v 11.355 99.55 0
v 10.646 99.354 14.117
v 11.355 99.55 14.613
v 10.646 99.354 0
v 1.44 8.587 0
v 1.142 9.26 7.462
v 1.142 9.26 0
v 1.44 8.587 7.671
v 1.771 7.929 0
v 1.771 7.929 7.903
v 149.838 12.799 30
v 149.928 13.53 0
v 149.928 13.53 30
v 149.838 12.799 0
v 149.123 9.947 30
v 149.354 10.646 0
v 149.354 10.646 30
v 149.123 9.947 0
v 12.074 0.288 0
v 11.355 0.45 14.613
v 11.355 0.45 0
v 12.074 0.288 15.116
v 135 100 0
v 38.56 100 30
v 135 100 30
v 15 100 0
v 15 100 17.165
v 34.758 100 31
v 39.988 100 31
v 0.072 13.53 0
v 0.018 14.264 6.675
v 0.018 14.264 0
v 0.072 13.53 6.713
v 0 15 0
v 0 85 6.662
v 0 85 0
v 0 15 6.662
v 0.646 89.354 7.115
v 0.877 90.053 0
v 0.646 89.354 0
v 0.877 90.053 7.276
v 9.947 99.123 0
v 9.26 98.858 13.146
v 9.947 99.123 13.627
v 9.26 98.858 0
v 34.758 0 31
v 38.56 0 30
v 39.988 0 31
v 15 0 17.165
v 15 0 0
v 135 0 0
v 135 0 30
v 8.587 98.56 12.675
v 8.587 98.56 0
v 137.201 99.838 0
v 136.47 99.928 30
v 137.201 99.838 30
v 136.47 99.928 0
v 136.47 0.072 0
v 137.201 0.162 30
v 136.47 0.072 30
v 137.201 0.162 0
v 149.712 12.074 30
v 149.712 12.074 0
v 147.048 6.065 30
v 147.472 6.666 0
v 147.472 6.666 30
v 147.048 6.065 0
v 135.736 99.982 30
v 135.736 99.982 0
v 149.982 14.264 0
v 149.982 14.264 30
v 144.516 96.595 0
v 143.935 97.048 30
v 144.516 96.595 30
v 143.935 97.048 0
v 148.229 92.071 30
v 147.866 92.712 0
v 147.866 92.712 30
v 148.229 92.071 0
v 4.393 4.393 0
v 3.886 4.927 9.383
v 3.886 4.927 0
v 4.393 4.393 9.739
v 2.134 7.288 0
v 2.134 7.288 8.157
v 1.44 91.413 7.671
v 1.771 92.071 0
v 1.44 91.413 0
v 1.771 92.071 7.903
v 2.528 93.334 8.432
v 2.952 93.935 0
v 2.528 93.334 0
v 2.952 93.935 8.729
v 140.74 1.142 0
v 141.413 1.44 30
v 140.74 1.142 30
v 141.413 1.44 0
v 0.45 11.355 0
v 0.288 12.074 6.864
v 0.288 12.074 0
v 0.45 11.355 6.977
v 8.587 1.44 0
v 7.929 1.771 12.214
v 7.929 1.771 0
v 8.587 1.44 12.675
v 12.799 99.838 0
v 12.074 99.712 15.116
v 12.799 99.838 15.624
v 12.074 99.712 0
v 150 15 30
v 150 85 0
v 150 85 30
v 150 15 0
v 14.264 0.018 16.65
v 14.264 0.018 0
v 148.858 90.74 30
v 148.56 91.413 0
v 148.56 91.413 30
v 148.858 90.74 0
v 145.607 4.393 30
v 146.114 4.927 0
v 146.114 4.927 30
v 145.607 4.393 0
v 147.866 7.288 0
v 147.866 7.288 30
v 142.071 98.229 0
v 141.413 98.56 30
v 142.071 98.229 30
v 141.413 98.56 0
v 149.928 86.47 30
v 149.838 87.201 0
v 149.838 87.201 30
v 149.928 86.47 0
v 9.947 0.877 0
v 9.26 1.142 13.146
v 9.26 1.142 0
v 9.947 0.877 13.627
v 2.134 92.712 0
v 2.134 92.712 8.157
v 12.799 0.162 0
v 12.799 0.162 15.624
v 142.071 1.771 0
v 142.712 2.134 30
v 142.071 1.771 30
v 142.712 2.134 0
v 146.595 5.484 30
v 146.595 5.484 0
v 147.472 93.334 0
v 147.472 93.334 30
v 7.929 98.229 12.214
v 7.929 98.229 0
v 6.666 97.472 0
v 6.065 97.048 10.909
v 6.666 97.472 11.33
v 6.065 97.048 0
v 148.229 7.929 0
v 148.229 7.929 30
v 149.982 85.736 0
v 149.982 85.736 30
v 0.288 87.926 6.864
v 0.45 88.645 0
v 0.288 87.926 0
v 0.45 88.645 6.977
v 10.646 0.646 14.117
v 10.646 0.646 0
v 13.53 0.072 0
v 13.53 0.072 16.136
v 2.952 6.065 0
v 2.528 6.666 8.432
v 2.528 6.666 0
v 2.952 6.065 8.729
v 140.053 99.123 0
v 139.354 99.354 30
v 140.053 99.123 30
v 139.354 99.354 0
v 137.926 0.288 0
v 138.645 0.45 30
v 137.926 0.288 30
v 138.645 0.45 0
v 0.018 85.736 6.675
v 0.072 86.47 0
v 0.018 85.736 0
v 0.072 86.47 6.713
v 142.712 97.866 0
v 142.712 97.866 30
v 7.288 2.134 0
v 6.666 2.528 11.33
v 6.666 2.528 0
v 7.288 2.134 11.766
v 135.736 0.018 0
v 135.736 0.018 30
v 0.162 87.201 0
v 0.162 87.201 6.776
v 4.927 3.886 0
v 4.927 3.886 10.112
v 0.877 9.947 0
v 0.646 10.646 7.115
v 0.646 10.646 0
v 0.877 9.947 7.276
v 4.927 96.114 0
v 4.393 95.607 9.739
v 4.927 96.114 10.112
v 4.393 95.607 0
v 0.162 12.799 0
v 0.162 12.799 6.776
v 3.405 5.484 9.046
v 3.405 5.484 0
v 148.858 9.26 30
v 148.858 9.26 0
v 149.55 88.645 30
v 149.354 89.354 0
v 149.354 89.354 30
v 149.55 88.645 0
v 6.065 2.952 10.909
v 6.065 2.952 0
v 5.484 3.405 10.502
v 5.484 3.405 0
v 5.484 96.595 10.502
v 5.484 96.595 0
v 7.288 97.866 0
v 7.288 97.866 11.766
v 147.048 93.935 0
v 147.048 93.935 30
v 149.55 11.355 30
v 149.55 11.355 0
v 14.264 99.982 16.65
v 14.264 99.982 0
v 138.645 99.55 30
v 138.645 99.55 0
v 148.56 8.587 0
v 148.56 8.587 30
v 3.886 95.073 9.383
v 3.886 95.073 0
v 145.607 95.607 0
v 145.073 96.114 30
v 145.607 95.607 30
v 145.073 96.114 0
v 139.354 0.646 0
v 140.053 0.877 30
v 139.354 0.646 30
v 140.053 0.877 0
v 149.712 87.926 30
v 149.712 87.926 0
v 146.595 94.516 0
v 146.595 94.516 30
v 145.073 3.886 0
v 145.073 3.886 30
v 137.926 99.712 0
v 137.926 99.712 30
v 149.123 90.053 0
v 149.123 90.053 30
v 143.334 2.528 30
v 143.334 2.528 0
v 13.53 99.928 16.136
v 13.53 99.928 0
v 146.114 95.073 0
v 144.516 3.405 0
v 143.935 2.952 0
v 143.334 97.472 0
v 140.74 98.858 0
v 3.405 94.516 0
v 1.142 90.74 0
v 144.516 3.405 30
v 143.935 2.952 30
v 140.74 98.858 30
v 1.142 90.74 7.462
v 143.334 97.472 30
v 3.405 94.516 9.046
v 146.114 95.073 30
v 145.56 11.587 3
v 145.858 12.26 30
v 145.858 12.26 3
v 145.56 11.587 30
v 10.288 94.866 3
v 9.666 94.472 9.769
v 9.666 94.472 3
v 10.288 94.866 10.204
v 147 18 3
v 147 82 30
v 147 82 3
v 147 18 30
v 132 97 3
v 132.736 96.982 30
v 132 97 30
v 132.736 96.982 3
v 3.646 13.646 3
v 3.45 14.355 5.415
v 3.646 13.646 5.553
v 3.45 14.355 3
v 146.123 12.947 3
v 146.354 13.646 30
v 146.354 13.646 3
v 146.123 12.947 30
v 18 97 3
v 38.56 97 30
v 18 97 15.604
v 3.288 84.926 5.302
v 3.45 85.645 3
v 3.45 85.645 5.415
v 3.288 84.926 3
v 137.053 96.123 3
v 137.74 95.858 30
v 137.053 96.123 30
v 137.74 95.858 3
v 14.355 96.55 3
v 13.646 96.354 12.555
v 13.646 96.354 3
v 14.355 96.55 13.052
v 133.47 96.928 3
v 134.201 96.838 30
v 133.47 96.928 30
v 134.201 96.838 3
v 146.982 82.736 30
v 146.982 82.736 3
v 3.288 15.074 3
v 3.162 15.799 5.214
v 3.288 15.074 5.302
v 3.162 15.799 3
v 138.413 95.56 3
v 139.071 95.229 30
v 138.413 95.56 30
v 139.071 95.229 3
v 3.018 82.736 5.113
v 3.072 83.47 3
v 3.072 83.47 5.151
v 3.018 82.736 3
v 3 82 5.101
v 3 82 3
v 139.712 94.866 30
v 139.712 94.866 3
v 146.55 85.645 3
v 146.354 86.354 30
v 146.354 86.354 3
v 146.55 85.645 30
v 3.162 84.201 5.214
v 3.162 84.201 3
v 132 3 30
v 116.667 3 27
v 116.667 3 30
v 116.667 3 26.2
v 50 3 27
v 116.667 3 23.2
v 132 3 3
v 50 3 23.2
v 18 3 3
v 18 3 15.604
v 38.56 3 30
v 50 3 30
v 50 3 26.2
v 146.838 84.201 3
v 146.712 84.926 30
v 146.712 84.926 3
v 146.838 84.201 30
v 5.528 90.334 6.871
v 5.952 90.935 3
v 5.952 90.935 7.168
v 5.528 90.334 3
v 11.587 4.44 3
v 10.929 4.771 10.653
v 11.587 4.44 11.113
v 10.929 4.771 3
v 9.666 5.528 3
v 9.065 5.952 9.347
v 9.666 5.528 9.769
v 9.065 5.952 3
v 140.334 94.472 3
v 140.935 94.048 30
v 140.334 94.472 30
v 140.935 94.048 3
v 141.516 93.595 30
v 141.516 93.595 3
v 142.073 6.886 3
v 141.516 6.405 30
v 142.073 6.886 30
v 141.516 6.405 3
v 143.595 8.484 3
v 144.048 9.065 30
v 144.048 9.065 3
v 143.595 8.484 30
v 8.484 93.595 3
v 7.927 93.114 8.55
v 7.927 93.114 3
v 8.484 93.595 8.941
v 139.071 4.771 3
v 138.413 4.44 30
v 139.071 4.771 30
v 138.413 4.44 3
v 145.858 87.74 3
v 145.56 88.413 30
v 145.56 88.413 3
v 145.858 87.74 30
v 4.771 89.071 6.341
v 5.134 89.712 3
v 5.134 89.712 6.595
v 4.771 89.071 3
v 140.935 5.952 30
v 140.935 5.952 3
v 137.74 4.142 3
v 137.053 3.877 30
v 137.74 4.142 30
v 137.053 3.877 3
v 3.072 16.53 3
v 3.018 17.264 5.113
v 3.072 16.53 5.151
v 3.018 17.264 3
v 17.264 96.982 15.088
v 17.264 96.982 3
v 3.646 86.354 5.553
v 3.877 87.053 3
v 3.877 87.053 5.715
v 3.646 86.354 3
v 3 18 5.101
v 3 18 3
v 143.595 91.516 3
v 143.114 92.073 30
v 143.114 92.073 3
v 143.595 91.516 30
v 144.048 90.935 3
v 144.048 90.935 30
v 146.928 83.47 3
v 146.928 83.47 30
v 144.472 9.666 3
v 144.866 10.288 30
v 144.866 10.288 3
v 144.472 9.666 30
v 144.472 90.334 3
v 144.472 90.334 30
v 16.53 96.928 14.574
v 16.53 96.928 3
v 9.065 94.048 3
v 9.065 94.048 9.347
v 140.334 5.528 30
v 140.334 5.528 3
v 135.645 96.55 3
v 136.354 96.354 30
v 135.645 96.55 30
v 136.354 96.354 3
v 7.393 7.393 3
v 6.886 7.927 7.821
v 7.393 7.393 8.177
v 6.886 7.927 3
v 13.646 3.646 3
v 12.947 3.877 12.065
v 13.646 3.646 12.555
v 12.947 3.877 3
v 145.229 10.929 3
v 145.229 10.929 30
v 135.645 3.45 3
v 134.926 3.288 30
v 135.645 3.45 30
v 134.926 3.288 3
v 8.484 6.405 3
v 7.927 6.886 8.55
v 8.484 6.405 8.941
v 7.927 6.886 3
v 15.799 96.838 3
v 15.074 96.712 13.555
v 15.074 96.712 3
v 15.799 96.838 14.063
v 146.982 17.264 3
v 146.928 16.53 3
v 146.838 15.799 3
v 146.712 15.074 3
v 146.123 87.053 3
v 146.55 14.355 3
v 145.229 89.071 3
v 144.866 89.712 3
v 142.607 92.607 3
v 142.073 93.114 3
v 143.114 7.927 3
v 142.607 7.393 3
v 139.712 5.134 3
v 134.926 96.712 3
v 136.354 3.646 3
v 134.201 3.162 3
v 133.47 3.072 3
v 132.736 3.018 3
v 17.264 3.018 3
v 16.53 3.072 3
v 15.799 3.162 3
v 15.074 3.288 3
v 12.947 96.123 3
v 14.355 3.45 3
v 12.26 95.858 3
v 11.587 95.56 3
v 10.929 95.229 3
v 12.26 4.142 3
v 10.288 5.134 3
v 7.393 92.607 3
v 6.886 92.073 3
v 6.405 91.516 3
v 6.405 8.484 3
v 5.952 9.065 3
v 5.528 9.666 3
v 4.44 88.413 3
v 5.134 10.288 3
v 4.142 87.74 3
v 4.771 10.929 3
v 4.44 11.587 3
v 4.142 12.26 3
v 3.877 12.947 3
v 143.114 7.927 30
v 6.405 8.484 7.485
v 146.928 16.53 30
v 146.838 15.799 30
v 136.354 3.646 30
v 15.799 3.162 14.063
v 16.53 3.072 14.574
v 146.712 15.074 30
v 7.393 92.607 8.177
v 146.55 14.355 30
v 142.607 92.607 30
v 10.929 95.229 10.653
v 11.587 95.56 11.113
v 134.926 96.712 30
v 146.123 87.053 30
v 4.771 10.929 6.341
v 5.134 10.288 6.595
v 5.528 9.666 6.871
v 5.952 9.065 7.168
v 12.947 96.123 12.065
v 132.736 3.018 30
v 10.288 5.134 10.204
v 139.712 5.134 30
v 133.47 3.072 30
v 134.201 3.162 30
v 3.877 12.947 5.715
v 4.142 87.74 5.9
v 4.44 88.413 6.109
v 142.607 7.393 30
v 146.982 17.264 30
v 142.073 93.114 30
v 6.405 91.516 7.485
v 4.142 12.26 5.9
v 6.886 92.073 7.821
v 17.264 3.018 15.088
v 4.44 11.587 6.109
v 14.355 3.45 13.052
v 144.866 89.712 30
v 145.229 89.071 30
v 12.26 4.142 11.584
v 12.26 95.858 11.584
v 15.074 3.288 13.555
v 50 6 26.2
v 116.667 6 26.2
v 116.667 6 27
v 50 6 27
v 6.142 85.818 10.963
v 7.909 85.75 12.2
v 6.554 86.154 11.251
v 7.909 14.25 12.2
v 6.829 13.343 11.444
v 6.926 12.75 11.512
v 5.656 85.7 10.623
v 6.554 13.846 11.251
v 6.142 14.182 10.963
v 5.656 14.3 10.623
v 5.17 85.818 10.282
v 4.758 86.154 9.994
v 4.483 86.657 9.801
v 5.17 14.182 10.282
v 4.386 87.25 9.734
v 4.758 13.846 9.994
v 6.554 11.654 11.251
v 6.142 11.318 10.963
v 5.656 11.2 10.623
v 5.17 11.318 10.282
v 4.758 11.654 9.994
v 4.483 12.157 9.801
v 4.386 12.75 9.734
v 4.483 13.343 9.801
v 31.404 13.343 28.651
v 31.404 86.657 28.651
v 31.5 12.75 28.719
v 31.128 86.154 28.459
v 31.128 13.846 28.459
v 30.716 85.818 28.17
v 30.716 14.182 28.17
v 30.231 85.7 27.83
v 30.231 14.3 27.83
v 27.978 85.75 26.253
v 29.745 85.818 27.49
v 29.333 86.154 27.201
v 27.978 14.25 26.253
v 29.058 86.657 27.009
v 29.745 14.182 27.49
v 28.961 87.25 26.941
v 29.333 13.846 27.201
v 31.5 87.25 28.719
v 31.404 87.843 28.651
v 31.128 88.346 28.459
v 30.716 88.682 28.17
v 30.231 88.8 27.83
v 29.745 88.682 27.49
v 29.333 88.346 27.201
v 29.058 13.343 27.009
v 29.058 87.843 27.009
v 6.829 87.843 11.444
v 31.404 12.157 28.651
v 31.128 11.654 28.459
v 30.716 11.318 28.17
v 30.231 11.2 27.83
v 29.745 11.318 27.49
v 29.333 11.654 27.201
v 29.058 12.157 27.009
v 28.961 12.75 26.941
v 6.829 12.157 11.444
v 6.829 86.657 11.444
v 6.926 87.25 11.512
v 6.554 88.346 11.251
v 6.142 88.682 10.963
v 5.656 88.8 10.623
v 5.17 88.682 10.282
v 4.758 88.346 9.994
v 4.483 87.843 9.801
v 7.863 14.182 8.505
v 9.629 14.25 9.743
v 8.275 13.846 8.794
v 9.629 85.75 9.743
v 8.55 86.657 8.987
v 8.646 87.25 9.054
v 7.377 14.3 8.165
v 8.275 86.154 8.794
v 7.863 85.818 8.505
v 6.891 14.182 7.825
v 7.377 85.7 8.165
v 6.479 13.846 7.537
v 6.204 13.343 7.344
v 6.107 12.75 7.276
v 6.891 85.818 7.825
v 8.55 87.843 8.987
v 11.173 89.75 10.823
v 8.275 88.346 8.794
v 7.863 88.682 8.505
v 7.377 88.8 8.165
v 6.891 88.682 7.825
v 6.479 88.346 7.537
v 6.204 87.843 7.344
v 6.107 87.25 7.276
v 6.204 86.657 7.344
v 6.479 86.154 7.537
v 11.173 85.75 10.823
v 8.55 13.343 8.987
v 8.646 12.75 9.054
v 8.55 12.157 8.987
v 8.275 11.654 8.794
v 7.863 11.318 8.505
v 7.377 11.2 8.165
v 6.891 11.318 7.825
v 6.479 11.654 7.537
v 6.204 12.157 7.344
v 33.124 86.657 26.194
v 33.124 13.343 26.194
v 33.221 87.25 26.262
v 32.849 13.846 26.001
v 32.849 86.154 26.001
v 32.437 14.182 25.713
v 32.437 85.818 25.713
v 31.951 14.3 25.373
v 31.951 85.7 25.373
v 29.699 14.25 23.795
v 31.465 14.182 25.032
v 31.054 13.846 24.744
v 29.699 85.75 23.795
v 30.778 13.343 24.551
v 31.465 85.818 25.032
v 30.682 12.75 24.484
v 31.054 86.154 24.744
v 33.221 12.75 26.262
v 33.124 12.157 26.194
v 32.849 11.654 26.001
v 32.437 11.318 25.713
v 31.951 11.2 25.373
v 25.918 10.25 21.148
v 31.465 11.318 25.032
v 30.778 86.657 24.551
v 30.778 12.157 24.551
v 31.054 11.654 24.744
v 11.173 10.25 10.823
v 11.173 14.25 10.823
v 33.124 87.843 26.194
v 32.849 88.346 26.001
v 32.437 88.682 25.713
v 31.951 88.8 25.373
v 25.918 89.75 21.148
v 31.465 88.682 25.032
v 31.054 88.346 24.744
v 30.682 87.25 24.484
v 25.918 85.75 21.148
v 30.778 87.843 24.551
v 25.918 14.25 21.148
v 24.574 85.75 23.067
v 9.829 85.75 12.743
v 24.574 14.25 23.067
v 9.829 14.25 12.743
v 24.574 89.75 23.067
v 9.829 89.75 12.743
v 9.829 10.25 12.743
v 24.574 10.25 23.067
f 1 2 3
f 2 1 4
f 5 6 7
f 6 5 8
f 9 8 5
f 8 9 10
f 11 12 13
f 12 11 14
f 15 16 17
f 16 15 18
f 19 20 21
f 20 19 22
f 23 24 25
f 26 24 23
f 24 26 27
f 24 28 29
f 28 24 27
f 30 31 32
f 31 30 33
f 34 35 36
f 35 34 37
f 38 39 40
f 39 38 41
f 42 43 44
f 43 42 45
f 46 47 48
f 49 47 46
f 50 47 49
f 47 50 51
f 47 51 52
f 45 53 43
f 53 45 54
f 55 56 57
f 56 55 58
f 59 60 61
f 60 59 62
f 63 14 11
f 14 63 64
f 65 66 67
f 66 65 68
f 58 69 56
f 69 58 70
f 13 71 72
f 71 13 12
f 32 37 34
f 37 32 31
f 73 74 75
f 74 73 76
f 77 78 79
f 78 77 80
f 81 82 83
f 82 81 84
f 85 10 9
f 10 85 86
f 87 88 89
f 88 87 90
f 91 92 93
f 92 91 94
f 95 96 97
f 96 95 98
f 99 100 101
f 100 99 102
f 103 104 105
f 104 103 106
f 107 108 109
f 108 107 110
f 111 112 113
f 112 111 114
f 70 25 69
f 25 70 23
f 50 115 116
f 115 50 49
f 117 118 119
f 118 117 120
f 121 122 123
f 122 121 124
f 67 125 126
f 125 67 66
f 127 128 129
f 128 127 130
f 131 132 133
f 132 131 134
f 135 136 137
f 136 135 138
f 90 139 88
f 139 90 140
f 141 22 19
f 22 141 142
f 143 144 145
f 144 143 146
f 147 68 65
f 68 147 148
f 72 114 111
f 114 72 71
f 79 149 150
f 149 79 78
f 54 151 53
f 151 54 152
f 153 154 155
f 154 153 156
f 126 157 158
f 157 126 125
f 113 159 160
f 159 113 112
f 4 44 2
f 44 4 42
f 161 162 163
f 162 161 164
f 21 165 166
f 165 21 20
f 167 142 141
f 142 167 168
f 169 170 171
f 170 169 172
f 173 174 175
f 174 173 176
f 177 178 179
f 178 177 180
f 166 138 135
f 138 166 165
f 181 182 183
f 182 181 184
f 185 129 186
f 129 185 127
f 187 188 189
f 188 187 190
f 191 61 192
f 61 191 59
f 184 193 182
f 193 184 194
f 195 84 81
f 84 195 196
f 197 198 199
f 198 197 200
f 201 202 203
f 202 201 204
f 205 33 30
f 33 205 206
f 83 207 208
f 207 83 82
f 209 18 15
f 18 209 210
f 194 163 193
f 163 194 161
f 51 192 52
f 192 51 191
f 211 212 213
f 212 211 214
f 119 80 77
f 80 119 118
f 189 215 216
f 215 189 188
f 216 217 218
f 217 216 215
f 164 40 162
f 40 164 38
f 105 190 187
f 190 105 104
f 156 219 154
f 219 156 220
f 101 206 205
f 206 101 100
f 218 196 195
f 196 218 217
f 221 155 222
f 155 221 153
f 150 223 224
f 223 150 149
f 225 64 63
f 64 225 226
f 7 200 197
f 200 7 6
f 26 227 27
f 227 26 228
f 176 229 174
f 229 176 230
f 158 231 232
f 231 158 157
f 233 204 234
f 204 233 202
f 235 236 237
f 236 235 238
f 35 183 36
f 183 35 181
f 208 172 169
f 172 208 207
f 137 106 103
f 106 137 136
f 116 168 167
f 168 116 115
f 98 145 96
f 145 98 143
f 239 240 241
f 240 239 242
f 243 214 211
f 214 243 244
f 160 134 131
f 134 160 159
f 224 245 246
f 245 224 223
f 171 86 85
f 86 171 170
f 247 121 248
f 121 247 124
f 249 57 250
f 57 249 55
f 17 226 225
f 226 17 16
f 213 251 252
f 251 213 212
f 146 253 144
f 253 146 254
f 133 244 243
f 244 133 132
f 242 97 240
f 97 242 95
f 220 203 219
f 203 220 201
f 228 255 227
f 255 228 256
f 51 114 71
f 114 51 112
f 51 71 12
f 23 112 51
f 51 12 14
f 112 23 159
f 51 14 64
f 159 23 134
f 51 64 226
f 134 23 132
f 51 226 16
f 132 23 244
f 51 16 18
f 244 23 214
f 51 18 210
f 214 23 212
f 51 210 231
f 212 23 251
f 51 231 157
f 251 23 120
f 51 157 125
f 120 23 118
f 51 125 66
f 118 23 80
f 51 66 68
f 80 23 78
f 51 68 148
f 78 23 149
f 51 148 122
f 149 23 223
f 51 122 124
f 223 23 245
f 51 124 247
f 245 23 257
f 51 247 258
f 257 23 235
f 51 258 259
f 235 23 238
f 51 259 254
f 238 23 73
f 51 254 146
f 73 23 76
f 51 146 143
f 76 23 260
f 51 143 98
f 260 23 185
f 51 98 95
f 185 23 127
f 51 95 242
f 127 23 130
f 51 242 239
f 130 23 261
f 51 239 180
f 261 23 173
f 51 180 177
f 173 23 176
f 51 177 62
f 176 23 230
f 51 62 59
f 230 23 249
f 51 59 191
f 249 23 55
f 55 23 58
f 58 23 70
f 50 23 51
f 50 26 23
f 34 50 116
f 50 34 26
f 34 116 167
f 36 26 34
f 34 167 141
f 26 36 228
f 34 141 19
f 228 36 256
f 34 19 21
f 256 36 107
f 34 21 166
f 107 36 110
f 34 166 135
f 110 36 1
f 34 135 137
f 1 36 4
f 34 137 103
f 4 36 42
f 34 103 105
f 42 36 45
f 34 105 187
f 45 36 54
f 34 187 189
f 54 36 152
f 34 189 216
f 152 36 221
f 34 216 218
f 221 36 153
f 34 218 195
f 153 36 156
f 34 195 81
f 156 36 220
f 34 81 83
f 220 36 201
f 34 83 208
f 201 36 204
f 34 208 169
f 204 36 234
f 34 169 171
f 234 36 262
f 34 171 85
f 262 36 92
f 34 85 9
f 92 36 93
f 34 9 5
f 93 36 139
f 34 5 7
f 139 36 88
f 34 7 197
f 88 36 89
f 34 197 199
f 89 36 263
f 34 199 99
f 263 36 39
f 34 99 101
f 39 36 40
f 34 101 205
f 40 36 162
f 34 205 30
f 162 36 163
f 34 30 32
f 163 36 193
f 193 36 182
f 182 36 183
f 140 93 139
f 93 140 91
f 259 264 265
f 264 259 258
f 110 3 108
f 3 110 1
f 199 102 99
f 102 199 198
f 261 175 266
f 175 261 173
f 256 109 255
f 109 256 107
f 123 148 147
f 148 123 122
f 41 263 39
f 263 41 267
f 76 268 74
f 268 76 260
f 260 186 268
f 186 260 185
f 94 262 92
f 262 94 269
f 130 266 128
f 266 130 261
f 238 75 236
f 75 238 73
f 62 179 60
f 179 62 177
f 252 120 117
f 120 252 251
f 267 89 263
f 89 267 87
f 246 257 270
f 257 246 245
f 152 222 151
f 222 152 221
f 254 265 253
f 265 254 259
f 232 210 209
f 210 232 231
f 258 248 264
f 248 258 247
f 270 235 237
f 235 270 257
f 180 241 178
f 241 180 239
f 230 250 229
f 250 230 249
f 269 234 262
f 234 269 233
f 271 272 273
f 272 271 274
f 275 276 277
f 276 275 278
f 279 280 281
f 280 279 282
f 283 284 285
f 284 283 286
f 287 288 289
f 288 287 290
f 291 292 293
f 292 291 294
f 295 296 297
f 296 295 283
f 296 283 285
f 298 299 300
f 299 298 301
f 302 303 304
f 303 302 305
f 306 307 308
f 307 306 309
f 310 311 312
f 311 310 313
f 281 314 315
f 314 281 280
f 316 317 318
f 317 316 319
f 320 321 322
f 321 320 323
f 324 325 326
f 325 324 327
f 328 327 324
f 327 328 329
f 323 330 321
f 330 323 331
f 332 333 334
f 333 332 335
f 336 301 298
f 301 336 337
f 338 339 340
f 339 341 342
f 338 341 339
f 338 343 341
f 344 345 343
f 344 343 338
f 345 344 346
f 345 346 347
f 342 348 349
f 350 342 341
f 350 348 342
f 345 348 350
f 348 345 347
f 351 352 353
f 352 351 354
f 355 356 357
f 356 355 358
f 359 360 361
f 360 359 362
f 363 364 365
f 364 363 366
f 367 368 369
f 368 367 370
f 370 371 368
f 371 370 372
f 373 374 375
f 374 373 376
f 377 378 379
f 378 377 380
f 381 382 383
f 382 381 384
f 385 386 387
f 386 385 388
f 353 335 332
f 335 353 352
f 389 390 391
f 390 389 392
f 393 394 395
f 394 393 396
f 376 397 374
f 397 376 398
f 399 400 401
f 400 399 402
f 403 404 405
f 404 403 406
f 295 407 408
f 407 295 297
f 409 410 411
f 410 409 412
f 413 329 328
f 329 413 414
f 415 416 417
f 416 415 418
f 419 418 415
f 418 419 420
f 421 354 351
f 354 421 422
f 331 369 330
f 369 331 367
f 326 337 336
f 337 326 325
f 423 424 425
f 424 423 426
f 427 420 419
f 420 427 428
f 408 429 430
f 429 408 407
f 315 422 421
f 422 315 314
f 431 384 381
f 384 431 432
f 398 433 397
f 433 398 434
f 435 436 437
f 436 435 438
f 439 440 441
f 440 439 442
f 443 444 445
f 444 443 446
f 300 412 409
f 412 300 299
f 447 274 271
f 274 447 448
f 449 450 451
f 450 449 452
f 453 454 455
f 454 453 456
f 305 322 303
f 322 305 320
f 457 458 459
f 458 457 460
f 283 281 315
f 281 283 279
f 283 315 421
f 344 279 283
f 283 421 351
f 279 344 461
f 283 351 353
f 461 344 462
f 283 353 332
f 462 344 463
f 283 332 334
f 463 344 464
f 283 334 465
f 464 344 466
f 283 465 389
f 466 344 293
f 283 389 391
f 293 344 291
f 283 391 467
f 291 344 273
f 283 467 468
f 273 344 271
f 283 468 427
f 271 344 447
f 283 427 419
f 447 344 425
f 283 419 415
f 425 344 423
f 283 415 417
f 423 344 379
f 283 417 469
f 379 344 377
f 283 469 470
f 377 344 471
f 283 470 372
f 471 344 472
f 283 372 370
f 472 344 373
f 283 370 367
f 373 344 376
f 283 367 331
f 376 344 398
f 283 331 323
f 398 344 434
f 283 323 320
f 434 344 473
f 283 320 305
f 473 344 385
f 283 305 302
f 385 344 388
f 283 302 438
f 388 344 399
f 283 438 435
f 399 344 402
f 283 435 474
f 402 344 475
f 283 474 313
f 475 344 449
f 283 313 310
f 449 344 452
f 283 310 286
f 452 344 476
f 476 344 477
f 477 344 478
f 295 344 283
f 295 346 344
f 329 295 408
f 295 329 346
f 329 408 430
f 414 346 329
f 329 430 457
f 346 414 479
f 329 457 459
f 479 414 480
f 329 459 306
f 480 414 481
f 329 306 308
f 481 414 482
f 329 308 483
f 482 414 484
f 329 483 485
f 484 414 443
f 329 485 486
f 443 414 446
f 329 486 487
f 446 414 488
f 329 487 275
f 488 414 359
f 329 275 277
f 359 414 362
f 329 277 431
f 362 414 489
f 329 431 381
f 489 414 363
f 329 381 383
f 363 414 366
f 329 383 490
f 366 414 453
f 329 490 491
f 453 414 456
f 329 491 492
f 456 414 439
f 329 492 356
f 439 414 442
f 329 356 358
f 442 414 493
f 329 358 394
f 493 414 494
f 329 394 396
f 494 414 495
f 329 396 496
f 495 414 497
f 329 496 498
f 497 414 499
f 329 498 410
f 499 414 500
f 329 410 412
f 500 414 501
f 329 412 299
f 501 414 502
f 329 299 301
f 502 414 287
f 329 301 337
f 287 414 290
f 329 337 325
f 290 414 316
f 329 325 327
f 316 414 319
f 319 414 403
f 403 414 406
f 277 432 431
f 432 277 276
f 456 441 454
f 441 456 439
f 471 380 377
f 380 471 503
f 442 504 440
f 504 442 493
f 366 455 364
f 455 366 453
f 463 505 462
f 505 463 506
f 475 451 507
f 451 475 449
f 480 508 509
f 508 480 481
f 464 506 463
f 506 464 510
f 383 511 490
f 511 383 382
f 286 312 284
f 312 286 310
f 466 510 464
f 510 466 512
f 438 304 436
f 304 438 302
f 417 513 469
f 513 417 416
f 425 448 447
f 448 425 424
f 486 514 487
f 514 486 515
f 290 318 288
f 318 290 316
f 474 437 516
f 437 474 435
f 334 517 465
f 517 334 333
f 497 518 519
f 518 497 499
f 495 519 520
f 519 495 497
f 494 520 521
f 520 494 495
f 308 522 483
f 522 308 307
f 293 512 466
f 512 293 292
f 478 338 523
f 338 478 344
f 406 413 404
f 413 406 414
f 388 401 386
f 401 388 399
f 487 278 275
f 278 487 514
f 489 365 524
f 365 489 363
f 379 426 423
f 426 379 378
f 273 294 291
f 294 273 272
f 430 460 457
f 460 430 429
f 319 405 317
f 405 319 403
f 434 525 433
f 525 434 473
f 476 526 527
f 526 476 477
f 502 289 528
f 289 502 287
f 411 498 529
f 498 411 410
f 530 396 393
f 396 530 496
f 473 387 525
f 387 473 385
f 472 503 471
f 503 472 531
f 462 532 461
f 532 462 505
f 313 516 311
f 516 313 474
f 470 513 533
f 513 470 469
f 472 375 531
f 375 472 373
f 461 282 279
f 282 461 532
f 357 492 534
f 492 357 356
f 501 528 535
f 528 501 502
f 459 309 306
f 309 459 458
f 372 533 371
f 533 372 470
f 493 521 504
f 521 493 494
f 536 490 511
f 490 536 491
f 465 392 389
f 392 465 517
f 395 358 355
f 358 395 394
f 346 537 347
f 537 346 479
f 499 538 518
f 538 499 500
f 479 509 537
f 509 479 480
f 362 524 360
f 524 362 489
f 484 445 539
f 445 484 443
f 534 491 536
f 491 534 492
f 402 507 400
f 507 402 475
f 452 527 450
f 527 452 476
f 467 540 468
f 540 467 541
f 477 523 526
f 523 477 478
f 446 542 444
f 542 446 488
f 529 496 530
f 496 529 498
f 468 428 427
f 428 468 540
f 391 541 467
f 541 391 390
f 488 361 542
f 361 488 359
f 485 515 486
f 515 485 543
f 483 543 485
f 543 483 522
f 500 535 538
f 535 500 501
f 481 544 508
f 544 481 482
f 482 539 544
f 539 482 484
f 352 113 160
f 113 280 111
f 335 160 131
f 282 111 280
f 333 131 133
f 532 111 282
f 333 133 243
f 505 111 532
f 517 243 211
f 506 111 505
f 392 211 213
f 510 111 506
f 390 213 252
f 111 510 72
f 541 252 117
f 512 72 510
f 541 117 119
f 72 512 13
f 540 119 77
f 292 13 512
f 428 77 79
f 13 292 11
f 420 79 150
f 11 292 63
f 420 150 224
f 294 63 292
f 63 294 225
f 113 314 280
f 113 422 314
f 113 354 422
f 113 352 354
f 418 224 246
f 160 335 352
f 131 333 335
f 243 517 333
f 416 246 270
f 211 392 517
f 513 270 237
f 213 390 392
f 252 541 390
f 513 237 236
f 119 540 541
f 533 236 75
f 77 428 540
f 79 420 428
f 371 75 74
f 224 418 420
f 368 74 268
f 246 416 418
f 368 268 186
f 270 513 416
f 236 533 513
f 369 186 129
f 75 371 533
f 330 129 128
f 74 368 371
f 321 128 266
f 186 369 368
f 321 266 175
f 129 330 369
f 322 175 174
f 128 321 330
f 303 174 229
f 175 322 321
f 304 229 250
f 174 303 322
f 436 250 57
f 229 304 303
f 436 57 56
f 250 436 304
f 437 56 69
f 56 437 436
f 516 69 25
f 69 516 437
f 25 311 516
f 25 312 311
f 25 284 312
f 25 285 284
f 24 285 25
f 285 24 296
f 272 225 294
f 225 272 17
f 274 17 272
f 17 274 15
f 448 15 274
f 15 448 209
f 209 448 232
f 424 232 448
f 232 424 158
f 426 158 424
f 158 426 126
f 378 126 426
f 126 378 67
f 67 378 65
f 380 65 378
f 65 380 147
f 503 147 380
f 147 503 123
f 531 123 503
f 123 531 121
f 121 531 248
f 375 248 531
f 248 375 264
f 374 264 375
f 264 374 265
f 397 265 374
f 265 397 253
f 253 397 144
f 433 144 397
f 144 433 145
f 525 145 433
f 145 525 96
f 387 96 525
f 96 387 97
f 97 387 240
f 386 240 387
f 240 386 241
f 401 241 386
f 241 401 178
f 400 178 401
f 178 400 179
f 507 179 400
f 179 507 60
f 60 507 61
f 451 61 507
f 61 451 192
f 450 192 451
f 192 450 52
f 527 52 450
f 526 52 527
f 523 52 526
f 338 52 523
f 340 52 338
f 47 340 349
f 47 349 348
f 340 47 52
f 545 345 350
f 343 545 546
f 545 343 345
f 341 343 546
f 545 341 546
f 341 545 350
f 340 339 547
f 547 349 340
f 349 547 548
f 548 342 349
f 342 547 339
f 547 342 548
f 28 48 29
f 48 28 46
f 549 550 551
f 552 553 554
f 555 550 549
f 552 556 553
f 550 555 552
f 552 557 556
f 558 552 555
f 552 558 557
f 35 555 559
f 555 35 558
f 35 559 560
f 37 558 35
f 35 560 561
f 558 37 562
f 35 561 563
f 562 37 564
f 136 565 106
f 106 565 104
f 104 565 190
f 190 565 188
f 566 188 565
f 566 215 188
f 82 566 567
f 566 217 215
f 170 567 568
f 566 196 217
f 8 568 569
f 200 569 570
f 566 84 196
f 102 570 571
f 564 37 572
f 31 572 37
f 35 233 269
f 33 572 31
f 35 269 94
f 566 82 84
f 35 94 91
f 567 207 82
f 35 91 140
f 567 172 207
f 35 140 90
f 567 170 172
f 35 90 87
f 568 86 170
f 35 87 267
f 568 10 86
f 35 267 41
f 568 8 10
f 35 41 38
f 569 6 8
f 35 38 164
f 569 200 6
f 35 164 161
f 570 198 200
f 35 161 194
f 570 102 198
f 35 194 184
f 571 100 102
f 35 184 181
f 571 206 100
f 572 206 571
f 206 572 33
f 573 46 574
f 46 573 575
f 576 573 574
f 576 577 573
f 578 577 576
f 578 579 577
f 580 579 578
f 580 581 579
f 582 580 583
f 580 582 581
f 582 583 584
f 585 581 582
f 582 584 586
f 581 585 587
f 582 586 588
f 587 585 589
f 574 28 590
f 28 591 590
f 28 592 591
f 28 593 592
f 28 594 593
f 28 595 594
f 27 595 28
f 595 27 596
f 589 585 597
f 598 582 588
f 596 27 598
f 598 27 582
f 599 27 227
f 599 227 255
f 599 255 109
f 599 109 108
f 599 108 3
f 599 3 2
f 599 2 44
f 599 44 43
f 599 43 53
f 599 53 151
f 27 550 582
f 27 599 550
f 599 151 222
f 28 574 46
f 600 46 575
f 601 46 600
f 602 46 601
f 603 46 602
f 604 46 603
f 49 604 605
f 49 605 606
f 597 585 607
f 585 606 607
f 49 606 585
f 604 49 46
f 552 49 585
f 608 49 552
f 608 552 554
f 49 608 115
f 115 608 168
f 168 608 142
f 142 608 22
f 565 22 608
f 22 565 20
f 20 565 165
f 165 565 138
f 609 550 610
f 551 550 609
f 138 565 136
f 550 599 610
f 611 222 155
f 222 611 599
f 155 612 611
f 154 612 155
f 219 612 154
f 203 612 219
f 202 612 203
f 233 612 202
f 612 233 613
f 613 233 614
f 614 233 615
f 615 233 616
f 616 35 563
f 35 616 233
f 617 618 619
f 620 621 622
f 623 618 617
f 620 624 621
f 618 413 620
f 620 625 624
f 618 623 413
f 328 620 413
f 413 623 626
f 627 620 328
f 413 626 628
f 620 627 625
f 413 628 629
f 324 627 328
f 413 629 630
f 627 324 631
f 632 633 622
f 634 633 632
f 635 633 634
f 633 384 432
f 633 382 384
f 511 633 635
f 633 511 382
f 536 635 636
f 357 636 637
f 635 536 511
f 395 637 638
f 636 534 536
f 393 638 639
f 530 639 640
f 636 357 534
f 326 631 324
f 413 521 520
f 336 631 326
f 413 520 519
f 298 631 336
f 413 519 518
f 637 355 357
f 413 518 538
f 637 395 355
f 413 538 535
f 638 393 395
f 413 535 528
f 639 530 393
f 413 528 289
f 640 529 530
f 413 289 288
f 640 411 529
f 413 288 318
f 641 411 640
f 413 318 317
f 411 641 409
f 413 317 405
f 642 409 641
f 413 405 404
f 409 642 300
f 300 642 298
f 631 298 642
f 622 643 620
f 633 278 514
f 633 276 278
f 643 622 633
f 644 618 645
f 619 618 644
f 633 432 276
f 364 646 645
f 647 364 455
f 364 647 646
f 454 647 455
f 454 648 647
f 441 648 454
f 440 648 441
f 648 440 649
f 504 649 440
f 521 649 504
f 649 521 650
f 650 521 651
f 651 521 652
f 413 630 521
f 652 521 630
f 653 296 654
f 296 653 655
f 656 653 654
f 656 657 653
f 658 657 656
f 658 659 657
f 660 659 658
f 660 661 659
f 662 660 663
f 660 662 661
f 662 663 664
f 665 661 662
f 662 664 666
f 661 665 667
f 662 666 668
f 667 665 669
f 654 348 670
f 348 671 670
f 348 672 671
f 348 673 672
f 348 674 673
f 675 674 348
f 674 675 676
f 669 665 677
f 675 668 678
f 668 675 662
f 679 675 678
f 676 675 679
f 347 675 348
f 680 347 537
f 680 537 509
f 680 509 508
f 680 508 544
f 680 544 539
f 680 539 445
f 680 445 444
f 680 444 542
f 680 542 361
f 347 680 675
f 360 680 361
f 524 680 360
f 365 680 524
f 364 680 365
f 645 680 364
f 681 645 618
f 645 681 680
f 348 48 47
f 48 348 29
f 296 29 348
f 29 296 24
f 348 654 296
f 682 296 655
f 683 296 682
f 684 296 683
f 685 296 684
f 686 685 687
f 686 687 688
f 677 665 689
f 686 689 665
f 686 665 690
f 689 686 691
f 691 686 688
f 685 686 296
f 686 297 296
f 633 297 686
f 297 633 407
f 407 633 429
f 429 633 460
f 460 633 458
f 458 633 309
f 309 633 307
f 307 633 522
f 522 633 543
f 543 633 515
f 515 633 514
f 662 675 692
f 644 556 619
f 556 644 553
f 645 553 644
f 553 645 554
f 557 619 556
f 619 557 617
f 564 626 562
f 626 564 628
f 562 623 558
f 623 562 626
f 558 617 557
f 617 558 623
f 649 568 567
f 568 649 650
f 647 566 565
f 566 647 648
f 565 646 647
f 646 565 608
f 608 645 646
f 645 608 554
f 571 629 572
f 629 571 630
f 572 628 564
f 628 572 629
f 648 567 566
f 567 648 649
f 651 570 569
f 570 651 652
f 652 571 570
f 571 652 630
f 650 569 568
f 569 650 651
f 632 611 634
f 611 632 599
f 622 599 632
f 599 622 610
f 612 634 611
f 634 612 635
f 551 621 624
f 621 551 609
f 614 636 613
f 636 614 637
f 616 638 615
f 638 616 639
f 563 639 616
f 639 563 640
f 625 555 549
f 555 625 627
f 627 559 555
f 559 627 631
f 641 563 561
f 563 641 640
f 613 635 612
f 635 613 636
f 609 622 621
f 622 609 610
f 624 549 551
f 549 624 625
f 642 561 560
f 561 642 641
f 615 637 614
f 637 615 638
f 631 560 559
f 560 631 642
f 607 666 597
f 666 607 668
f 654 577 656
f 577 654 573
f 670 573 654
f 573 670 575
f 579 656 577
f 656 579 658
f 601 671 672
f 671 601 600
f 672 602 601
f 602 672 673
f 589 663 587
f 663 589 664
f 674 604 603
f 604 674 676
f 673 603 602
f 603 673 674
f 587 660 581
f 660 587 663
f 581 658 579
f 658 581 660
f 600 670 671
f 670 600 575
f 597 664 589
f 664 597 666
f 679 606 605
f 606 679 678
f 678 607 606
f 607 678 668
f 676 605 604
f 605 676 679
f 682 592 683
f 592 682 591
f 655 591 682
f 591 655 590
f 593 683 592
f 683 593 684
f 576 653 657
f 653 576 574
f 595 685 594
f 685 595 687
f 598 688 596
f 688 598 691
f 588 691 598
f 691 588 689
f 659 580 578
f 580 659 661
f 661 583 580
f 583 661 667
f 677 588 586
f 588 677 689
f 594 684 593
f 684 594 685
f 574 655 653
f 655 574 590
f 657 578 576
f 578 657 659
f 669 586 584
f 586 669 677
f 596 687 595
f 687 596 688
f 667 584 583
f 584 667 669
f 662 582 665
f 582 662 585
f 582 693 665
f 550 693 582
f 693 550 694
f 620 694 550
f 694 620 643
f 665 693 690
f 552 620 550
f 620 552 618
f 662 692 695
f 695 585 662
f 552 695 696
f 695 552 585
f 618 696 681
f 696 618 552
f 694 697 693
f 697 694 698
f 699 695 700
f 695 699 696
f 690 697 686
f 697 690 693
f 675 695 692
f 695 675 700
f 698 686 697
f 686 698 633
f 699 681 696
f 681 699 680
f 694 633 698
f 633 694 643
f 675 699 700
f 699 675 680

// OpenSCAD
$fn = $preview ? 32 : 128;
z_fight = $preview ? 0.05 : 0;

// dimensions of the main body
test_length = 150;
test_width = 100;
test_height = 30;

// radius of the corners
test_corner_radius = 15;

// thickness of the walls and top
test_wall_thickness = 3;

// angle of the front bevel
test_bevel_angle = 35;

// Show the platter and enclosure
show_enclosure = true;

// Show cross section view for testing
show_enclosure_cross_section = false;

// ---------------------------------------------------------------

if (show_enclosure)
  cross_section(show_enclosure_cross_section)
    enclosure(
      length=test_length, width=test_width, height=test_height, corner_radius=test_corner_radius,
      wall_thickness=test_wall_thickness, bevel_angle=test_bevel_angle
    );

// ---------------------------------------------------------------

// TODO: make these parameters through a look up table scheme or similar for different LCD sizes
// LCD dimensions and hole placements
lcd_height = 24.5;
lcd_width = 71.5;
lcd_backlight_depth = 3;
lcd_backlight_width = 8;
lcd_backlight_height = 18;
lcd_holes_height_dist = 30;
lcd_holes_width_dist = 74.5;
lcd_hole_diameter = 3.1;

module enclosure(length, width, height, corner_radius, wall_thickness, bevel_angle) {

  minkowskiDim = [corner_radius, corner_radius, 0];
  oDim = [length, width, height];
  iDim = oDim - [wall_thickness * 2, wall_thickness * 2, 0];

  // main body
  body(minkowskiDim, oDim, iDim, wall_thickness, bevel_angle);

  // front bevel
  front_bevel(minkowskiDim, oDim, wall_thickness, bevel_angle);
}

lip_gap = 0.8;

module body(minkowskiDim, oDim, iDim, wall_thickness, bevel_angle) {

  union() {
    difference() {

      translate([minkowskiDim[0], minkowskiDim[1], 0])
        difference() {

          // Main body
          minkowski() {
            translate([0, 0, 0])
              cube(oDim - minkowskiDim * 2, center=false);
            cylinder(r=minkowskiDim[0], h=1);
          }

          // Hollow out the inside
          minkowski() {
            translate([wall_thickness, wall_thickness, wall_thickness])
              cube(iDim - minkowskiDim * 2, center=false);
            cylinder(r=minkowskiDim[0], h=1);
          }
        }

      // Slice off top for a consistent height post-minkowski
      translate([-z_fight, -z_fight, oDim[2]])
        cube([oDim[0] + z_fight * 2, oDim[1] + z_fight * 2, oDim[2] * 2], center=false);

      // Front bevel cut off
      translate([0, -z_fight / 2, wall_thickness])
        rotate([0, -bevel_angle, 0])
          cube([oDim[2] * 2, oDim[1] + z_fight, oDim[2] * 2], center=false);
    }

    translate([oDim[1] / 2, wall_thickness, oDim[2] - wall_thickness - lip_gap])
      rotate([0, 90, 0])
        linear_extrude(height=oDim[1] * 2 / 3)
          polygon(points=[[0, 0], [wall_thickness, 0], [0, wall_thickness]]);

    translate([oDim[1] / 2 + oDim[1] * 2 / 3, wall_thickness, oDim[2] - wall_thickness])
      rotate([0, 270, 0])
        linear_extrude(height=oDim[1] * 2 / 3)
          polygon(points=[[0, 0], [wall_thickness, 0], [0, wall_thickness]]);
  }
}

module front_bevel(minkowskiDim, oDim, wall_thickness, bevel_angle) {

  difference() {

    // Front bevel face
    intersection() {
      translate([minkowskiDim[0], minkowskiDim[1], 0])
        minkowski() {
          cube(oDim - minkowskiDim * 2);
          cylinder(r=minkowskiDim[0], h=1);
        }

      rotate([0, -bevel_angle, 0])
        translate([0, 0, wall_thickness * cos(bevel_angle)])
          cube([oDim[2] * 2, oDim[1], wall_thickness]);
    }

    // LCD cut out on bevel
    translate([lcd_height / 2, (oDim[1] - lcd_width) / 2, wall_thickness * 2])
      rotate([0, -bevel_angle, 0])
        cube([lcd_height, lcd_width, oDim[2]]);

    // LCD cut out on bevel
    translate([lcd_backlight_height * 3 / 4, (oDim[1] - lcd_width - lcd_backlight_width) / 2, wall_thickness + lcd_backlight_height / 4])
      rotate([0, -bevel_angle, 0])
        cube([lcd_backlight_height, lcd_width + lcd_backlight_width, wall_thickness + 0.4 + lcd_backlight_depth]);

    // LCD cut out on bevel
    translate([lcd_height / 2, (oDim[1] - lcd_width) / 2, wall_thickness * 2])
      rotate([0, -bevel_angle, 0])for (x = [-1, 1], y = [-1, 1]) {
        translate([lcd_height / 2 + x * lcd_holes_height_dist / 2, lcd_width / 2 + y * lcd_holes_width_dist / 2, wall_thickness * 0])
          cylinder(h=oDim[2] * 2, r=lcd_hole_diameter / 2, $fn=16);
      }
  }
}

// Helper module to show cross section
module cross_section(show) {
  // Cross section view
  if (show) {
    difference() {
      children();

      translate([-z_fight, -z_fight, -250])
        cube([test_length / 2, test_width / 2, 500]);
    }
  } else {
    children();
  }
}
